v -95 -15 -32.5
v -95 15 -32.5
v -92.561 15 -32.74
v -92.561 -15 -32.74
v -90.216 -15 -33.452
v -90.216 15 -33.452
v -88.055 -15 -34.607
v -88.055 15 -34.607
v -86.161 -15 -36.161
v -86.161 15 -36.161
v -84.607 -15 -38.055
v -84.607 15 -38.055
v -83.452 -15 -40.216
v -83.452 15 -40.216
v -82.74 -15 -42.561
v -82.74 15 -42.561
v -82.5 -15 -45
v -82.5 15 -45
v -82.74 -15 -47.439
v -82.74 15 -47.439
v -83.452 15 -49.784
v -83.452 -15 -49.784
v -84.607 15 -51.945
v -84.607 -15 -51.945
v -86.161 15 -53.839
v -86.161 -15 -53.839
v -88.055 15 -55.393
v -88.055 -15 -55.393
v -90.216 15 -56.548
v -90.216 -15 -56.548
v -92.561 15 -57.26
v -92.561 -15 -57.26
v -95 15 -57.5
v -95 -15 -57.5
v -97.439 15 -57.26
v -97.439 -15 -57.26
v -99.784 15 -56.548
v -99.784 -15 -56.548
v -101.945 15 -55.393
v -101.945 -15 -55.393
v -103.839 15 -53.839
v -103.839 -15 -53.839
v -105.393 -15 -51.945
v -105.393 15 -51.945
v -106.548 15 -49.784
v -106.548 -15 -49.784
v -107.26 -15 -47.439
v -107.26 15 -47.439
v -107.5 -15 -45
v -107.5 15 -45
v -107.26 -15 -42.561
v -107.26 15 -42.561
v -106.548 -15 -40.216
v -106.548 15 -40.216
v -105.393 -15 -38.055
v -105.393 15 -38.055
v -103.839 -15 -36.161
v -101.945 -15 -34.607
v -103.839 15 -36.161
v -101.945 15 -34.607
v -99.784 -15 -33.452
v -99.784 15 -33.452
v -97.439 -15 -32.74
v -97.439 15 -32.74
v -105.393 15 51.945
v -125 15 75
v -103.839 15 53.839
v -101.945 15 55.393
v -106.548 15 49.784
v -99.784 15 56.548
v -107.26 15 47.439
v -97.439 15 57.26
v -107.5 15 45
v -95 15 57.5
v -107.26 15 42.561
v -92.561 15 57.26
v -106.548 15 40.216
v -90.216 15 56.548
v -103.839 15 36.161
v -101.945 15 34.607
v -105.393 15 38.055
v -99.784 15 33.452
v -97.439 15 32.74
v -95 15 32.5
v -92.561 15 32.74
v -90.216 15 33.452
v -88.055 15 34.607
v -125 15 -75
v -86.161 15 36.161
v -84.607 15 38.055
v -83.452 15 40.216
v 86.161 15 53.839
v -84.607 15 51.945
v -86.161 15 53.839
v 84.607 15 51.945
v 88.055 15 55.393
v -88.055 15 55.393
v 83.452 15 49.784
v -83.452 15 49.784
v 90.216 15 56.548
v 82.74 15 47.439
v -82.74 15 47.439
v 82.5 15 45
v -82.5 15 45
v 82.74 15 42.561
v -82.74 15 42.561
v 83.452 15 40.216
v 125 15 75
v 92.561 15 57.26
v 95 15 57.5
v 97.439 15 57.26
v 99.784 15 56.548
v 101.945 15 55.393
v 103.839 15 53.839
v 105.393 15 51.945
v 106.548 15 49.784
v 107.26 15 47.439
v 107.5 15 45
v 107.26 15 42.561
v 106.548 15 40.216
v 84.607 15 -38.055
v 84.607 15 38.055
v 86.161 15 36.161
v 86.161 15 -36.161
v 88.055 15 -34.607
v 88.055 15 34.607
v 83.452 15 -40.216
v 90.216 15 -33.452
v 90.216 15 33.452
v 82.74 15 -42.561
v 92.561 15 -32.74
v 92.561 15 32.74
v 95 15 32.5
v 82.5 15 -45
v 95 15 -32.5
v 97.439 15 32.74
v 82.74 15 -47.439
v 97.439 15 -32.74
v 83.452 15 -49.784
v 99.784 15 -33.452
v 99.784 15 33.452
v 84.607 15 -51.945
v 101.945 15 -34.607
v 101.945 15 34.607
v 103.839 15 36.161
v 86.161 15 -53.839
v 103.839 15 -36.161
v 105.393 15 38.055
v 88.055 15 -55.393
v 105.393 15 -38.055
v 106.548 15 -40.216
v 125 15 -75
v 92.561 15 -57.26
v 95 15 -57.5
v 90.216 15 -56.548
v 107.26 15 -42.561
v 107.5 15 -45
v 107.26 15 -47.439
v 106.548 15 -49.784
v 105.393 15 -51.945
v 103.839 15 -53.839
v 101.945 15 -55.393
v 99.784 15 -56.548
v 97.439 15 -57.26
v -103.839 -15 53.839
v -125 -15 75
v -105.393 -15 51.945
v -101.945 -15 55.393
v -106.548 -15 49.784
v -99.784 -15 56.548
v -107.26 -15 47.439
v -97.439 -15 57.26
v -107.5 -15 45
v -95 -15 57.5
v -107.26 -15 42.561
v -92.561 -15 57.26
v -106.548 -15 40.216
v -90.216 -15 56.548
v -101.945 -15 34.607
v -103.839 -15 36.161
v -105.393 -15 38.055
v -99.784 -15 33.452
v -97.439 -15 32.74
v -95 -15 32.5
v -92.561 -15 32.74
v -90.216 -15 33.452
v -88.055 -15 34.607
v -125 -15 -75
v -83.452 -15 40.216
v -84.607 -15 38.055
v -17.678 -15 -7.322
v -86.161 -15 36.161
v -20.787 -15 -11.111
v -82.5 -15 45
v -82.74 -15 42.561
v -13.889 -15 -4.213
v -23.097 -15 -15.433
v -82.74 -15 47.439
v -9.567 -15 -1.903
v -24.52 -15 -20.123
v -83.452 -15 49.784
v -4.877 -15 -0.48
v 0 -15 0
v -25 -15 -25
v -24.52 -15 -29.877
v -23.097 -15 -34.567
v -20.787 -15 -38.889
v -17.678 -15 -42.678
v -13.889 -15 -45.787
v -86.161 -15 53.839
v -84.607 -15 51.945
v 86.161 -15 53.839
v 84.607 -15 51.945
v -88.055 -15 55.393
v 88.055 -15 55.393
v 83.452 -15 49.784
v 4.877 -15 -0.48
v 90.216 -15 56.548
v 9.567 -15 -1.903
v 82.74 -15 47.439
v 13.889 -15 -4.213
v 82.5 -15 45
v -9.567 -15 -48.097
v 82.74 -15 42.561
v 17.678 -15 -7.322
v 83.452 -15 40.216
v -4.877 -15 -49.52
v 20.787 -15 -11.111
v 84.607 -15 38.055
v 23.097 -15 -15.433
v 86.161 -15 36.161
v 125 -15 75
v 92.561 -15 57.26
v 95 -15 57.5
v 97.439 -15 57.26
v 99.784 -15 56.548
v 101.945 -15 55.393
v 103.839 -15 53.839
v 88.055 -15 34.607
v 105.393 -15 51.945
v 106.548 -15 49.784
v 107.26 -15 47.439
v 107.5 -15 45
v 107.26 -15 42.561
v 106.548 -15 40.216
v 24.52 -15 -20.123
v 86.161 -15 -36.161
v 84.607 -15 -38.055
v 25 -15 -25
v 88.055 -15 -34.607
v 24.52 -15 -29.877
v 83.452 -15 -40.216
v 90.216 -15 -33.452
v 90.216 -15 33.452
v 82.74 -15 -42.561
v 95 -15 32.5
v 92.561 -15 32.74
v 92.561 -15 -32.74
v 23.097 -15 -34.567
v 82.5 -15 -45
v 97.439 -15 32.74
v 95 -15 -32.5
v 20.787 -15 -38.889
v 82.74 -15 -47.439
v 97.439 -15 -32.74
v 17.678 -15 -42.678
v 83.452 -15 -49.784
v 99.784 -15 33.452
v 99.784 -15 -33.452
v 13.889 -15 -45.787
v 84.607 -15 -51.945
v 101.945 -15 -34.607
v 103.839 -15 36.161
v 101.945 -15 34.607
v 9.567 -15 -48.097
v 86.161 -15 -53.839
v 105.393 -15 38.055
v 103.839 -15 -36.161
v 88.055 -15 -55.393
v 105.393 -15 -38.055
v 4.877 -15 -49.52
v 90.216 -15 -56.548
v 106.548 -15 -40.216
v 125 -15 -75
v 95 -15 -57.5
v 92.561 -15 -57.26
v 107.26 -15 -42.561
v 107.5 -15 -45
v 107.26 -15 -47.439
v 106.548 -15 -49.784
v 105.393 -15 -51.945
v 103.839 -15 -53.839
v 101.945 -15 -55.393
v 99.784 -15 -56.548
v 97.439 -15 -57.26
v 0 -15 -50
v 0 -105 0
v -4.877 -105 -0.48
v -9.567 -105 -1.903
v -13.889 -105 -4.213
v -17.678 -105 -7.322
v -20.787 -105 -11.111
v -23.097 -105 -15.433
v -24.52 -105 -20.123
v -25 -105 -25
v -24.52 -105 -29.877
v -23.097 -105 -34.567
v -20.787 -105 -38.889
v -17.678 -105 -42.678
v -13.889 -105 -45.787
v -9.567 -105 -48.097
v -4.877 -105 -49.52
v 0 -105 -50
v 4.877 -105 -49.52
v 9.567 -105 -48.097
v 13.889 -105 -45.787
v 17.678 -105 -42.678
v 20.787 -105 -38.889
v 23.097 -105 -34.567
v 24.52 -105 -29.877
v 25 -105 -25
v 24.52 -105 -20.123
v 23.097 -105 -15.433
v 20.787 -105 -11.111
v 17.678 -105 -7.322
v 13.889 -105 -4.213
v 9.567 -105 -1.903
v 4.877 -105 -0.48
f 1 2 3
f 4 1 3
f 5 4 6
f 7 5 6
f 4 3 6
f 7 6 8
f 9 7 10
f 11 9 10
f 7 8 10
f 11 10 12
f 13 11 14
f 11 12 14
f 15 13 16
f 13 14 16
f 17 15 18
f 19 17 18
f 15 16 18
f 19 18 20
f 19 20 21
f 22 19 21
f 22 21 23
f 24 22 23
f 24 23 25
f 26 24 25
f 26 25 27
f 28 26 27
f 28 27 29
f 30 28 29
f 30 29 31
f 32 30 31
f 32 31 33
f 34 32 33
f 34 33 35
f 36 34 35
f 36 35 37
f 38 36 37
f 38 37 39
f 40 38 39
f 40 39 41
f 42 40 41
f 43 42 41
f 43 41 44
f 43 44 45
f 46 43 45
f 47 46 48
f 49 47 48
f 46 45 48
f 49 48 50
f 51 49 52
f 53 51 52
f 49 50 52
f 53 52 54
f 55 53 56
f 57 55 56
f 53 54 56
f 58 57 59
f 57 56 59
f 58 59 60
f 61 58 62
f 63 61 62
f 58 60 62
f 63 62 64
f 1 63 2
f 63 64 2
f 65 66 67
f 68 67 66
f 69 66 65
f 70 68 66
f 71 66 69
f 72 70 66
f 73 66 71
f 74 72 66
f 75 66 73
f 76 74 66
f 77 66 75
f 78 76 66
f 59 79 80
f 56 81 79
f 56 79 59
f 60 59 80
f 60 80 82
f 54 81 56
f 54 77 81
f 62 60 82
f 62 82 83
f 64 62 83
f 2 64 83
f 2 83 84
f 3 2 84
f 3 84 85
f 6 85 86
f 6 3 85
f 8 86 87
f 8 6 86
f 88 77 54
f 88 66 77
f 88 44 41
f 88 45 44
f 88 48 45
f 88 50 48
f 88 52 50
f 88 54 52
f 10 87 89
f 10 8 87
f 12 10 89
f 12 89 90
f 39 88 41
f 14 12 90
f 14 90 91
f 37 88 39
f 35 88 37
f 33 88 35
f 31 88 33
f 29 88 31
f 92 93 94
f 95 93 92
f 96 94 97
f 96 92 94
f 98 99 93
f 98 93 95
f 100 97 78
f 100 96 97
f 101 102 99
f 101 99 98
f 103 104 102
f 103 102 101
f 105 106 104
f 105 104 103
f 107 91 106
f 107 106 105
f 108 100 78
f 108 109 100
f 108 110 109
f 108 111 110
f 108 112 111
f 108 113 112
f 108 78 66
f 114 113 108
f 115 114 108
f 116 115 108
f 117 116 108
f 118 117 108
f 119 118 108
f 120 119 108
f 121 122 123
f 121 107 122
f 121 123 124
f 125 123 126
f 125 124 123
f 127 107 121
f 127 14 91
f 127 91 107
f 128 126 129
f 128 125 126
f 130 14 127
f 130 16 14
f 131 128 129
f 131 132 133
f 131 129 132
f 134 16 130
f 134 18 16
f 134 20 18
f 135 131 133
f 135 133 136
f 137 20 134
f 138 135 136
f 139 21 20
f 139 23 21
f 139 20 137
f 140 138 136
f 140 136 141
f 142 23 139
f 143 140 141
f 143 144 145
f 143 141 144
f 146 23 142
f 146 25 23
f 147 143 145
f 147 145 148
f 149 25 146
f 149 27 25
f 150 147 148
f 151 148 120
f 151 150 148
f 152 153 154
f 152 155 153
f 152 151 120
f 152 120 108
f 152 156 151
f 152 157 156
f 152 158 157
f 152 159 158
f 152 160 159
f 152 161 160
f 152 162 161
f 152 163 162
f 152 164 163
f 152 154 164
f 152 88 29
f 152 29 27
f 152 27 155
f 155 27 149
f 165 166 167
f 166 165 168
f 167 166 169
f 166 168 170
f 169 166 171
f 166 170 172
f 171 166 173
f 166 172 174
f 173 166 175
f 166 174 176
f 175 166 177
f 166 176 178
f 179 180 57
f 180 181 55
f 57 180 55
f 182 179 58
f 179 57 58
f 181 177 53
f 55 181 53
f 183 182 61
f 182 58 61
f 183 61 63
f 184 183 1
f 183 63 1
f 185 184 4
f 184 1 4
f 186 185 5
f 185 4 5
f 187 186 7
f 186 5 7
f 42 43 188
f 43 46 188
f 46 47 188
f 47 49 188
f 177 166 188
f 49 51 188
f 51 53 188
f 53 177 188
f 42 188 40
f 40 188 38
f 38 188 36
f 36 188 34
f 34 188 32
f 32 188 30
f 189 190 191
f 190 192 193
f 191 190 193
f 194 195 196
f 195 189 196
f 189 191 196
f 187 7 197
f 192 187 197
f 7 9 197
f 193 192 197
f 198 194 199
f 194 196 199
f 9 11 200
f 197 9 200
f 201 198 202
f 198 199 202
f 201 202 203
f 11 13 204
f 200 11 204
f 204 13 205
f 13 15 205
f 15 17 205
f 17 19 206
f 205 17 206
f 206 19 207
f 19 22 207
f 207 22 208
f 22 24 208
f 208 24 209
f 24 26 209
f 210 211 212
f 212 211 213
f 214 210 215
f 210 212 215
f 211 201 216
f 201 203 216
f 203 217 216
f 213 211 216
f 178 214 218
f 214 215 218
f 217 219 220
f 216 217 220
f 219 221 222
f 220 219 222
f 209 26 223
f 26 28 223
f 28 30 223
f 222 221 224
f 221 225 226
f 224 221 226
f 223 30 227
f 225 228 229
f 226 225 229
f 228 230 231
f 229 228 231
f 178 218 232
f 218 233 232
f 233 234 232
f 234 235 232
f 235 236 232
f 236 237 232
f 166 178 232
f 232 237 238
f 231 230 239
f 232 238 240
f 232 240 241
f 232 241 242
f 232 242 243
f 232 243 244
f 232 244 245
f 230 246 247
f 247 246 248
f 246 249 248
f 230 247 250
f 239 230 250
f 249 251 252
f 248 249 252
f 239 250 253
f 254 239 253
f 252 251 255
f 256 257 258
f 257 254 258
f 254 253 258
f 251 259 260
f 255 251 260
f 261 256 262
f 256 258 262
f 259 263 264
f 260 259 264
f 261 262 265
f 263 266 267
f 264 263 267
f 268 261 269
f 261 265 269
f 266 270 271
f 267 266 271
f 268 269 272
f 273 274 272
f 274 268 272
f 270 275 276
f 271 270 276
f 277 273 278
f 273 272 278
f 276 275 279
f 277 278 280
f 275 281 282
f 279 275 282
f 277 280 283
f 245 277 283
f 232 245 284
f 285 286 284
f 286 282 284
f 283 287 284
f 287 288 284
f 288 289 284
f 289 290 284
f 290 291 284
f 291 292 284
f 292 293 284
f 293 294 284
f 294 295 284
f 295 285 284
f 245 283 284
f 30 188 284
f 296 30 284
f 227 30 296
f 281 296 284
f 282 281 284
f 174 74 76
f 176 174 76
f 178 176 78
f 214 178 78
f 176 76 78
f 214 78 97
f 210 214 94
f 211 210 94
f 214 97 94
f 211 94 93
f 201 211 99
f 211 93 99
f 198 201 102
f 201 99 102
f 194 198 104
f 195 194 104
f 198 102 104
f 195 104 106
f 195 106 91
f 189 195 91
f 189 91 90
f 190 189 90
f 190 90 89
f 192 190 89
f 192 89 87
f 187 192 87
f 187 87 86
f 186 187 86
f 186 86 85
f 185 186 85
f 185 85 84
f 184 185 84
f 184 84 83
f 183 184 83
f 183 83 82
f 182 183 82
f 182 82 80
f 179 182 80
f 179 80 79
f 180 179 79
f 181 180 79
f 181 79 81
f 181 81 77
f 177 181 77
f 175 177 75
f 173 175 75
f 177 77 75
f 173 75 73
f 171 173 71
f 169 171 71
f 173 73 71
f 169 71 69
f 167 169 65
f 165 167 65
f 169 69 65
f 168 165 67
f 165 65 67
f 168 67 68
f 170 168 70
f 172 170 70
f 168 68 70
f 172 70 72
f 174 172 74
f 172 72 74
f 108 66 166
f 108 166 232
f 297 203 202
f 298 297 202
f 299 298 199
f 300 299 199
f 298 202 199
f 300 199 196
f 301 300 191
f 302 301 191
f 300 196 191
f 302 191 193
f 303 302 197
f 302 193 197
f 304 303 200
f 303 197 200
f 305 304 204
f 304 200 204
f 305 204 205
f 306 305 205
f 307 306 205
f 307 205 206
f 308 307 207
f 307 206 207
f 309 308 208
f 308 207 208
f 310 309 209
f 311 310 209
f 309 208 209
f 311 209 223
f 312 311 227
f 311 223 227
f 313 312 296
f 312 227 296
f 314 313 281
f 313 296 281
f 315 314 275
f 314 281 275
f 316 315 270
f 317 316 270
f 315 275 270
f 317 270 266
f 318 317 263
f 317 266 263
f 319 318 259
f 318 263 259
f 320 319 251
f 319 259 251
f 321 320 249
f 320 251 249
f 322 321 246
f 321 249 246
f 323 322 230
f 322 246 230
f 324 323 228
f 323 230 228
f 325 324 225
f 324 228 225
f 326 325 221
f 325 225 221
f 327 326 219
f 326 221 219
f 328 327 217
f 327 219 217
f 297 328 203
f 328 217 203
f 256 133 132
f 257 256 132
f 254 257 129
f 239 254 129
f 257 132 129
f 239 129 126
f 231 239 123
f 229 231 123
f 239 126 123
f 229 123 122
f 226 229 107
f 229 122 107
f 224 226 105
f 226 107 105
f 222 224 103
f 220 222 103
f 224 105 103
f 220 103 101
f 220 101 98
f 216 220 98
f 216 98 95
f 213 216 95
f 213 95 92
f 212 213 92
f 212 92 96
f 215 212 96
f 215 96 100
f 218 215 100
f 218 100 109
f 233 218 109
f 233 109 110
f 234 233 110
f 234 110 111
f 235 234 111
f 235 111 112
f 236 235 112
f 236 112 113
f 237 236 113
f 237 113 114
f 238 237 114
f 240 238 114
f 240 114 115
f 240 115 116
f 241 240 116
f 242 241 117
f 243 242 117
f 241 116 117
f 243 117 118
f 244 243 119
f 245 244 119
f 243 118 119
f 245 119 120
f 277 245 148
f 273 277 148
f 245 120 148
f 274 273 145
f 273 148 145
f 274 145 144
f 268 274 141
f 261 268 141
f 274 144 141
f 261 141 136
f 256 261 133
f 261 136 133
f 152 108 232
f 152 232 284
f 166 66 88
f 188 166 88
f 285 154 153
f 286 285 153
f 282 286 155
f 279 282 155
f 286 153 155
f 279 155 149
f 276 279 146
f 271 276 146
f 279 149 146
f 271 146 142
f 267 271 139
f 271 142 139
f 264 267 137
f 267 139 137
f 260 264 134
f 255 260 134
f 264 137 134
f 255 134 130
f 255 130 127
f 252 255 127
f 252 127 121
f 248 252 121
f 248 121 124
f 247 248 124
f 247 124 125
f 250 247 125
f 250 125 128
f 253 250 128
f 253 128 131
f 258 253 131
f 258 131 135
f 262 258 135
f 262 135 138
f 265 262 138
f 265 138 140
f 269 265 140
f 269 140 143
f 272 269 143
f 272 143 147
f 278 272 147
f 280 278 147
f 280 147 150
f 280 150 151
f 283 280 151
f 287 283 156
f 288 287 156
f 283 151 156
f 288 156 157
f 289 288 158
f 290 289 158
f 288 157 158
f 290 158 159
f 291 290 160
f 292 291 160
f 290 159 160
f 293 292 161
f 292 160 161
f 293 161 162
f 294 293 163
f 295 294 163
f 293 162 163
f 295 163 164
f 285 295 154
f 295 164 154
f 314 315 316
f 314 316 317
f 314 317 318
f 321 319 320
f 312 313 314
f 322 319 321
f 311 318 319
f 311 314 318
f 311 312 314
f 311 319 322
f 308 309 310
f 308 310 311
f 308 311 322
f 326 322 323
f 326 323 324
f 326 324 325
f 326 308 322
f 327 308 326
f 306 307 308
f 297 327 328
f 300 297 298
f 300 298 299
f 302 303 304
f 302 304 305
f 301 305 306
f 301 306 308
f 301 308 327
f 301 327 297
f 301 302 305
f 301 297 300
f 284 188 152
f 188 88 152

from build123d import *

# Parameters (mm, degrees)
SKETCH2_W           = 250
SKETCH2_H           = 150
BOSS_EXTRUDE1_DEPTH = 15
SKETCH3_R           = 12.5
CUT_EXTRUDE1_DEPTH  = 149.828760661
SKETCH4_R           = 25
BOSS_EXTRUDE2_DEPTH = 90


with BuildPart() as part:
    # Sketch2 → Boss-Extrude1 (new, symmetric)
    with BuildSketch(Plane(origin=(0, 0, 0), x_dir=(1, 0, 0), z_dir=(0, 1, 0))):
        Rectangle(SKETCH2_W, SKETCH2_H)
    extrude(amount=BOSS_EXTRUDE1_DEPTH, both=True)

    # Sketch3 → Cut-Extrude1 (cut, through all)
    with BuildSketch(Plane(origin=(0, 15, 0), x_dir=(1, 0, 0), z_dir=(0, 1, 0))):
        with Locations(Location((-95, -45, 0), (0, 0, 270))):
            Circle(SKETCH3_R)
        with Locations(Location((-95, 45, 0), (0, 0, 270))):
            Circle(SKETCH3_R)
        with Locations(Location((95, -45, 0), (0, 0, 90))):
            Circle(SKETCH3_R)
        with Locations(Location((95, 45, 0), (0, 0, 90))):
            Circle(SKETCH3_R)
    extrude(amount=-CUT_EXTRUDE1_DEPTH, mode=Mode.SUBTRACT)

    # Sketch4 → Boss-Extrude2 (add)
    with BuildSketch(Plane.XZ.offset(15)):
        with Locations(Location((0, -25, 0), (0, 0, 90))):
            Circle(SKETCH4_R)
    extrude(amount=BOSS_EXTRUDE2_DEPTH)


solid = part.part
